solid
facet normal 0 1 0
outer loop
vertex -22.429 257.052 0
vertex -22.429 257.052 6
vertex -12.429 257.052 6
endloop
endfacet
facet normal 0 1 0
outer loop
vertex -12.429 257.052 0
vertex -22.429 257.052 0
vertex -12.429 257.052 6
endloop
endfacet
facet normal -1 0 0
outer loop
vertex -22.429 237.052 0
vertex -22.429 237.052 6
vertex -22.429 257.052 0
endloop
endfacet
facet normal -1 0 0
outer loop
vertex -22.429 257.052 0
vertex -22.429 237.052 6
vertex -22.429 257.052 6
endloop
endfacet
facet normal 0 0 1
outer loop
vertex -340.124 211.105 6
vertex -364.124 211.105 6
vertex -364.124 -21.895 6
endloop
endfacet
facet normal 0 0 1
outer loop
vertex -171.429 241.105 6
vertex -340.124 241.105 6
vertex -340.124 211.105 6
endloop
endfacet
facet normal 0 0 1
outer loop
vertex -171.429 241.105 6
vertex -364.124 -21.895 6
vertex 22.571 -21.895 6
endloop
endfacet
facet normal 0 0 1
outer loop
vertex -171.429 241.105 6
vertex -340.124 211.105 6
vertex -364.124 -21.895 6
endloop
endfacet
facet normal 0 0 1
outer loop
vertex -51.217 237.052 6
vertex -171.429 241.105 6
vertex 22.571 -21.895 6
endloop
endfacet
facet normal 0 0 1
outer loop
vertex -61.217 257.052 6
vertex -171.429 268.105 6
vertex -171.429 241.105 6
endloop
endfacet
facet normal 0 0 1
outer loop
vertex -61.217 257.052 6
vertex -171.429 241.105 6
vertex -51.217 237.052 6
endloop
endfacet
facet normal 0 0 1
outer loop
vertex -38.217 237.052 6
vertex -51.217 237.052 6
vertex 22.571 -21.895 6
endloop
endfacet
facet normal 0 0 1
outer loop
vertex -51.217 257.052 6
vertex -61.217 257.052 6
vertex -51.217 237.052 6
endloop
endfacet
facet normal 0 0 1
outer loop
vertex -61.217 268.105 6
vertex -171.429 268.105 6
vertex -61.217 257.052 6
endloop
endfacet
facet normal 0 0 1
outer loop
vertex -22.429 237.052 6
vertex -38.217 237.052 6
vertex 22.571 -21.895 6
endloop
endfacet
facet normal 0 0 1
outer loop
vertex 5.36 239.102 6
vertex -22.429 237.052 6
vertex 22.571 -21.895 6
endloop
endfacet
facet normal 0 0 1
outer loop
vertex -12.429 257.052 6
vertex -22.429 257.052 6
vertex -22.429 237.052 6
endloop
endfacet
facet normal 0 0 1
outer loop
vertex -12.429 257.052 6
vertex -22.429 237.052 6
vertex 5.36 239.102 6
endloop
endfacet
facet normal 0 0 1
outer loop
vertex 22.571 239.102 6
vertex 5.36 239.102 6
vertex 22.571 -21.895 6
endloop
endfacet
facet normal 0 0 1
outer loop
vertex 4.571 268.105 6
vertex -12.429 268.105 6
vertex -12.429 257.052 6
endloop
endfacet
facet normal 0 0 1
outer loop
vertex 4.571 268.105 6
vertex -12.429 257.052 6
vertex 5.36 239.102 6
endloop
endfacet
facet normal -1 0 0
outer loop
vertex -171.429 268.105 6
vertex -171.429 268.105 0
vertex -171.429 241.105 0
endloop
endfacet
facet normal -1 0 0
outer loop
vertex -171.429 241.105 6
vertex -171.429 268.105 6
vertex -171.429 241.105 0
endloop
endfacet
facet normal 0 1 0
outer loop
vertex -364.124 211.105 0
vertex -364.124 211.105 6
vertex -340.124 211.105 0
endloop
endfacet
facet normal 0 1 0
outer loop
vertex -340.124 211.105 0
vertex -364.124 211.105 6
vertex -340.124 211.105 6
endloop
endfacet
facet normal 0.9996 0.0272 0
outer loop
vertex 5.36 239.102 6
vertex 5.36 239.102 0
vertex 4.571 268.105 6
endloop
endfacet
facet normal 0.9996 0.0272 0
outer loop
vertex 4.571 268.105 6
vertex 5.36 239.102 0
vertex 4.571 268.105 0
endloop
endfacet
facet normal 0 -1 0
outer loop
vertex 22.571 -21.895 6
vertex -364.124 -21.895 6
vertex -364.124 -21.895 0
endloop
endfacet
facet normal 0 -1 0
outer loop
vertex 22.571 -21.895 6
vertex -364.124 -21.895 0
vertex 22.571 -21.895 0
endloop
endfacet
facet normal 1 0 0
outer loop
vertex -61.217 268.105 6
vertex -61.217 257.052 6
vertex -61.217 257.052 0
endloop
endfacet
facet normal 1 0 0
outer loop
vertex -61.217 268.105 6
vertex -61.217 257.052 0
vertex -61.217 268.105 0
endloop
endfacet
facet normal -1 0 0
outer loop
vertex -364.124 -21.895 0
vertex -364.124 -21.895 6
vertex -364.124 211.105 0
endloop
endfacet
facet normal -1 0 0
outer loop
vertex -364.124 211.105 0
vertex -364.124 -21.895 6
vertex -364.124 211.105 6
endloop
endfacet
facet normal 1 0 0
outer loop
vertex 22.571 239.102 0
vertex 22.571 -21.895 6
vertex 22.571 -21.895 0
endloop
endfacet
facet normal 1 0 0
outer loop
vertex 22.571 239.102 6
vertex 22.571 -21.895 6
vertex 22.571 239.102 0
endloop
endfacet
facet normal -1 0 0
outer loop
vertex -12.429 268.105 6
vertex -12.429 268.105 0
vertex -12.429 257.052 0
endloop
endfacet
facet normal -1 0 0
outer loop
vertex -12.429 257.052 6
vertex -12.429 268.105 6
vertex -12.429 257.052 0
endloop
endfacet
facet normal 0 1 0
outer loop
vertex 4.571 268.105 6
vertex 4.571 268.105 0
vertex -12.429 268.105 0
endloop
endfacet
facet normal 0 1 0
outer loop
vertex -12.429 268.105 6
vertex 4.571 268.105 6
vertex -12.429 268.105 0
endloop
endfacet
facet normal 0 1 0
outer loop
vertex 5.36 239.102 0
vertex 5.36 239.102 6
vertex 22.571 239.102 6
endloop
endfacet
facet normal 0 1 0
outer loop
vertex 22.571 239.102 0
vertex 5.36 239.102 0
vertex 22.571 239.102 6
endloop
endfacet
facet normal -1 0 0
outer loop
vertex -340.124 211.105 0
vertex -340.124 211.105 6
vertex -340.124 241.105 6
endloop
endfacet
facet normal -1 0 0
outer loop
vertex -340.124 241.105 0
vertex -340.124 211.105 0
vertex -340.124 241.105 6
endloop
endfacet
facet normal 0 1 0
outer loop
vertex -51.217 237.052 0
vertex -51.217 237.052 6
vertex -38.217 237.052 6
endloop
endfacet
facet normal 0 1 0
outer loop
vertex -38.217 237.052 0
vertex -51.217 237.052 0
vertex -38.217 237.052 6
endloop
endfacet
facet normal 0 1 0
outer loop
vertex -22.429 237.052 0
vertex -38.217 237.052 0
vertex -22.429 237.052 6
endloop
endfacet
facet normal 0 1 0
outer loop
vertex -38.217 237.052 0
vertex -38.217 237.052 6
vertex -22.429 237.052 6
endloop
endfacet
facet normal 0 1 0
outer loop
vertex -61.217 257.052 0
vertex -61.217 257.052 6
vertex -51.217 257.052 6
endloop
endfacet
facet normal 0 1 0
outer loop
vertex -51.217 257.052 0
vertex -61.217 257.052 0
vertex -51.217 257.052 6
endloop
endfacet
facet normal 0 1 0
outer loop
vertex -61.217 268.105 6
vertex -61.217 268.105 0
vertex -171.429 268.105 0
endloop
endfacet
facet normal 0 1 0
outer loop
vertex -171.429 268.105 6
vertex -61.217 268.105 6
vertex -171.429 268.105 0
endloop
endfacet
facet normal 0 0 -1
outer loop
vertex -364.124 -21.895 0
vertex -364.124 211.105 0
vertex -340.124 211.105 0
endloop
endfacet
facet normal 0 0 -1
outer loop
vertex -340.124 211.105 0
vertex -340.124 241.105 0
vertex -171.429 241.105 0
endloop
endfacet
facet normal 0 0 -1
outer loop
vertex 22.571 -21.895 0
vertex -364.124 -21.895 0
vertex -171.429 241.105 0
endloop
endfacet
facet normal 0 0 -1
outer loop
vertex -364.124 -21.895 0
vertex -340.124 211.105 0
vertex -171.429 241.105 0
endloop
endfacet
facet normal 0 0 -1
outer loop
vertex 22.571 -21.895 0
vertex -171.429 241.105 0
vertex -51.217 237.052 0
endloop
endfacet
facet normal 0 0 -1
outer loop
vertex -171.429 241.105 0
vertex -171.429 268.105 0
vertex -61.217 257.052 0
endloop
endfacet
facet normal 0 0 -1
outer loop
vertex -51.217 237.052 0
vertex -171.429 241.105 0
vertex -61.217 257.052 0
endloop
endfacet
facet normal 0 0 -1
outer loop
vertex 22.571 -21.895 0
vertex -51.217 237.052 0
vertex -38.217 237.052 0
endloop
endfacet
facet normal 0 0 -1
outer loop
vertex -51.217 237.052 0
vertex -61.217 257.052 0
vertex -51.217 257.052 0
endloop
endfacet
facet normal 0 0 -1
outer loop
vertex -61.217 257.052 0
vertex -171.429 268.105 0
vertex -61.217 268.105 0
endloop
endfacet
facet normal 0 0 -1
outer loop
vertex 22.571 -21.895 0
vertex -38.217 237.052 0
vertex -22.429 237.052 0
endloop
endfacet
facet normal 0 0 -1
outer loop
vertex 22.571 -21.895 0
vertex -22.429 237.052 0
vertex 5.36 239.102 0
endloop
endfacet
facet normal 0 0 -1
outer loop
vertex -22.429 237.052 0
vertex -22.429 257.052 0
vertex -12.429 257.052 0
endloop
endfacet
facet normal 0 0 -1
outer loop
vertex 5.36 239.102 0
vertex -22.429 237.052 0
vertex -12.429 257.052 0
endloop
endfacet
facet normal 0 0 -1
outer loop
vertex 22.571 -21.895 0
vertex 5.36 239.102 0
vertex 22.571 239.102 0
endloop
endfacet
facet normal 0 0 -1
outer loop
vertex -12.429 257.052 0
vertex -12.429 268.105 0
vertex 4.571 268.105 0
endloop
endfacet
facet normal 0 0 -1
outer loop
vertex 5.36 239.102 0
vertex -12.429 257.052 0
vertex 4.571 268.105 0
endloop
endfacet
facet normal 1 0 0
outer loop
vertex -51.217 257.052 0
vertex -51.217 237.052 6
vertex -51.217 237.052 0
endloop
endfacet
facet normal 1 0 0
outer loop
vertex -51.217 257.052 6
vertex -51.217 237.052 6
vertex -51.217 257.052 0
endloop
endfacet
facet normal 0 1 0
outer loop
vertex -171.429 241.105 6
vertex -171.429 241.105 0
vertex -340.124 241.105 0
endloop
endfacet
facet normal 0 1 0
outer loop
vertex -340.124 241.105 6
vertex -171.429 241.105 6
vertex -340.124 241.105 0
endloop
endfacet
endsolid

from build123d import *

# Parameters (mm, degrees)
BOSS_EXTRUDE1_DEPTH = 6
SKETCH2_W           = 30
SKETCH2_H           = 30
CUT_EXTRUDE1_DEPTH  = 10
SKETCH3_W           = 398.694966145
SKETCH3_H           = 1
CUT_EXTRUDE2_DEPTH  = 10
SKETCH4_W           = 6
SKETCH4_H           = 233
SKETCH4_H_2         = 258.947078575
CUT_EXTRUDE3_DEPTH  = 10
SKETCH5_W           = 23
SKETCH5_H           = 31.052921425
CUT_EXTRUDE4_DEPTH  = 10
SKETCH6_W           = 10
SKETCH6_H           = 20
BOSS_EXTRUDE2_DEPTH = 6
SKETCH7_W           = 17.21166374
SKETCH7_H           = 2.05
BOSS_EXTRUDE3_DEPTH = 6


with BuildPart() as part:
    # Sketch1 → Boss-Extrude1 (new body)
    with BuildSketch(Plane.XY):
        Polygon((28.571428571, 236.060202245), (28.571428571, 237.05184048), (5.415486436, 237.05184048), (4.571428571, 268.104761905), (-12.428571429, 268.104761905), (-12.428571429, 237.05184048), (-38.216595912, 237.05184048), (-38.216595912, 268.104761905), (-171.428571429, 268.104761905), (-171.428571429, 241.104761905), (-370.123537574, 241.104761905), (-370.123537574, -22.895238095), (28.571428571, -22.895238095), align=None)
    extrude(amount=BOSS_EXTRUDE1_DEPTH)

    # Sketch2 → Cut-Extrude1 (cut)
    with BuildSketch(Plane.XY.offset(6)):
        with Locations((-355.123537574, 226.104761905)):
            Rectangle(SKETCH2_W, SKETCH2_H)
    extrude(amount=-CUT_EXTRUDE1_DEPTH, mode=Mode.SUBTRACT)

    # Sketch3 → Cut-Extrude2 (cut)
    with BuildSketch(Plane.XY.offset(6)):
        with Locations((-170.776054501, -22.395238095)):
            Rectangle(SKETCH3_W, SKETCH3_H)
    extrude(amount=-CUT_EXTRUDE2_DEPTH, mode=Mode.SUBTRACT)

    # Sketch4 → Cut-Extrude3 (cut)
    with BuildSketch(Plane.XY.offset(6)):
        with Locations((-367.123537574, 94.604761905)):
            Rectangle(SKETCH4_W, SKETCH4_H)
        with Locations((25.571428571, 107.578301193)):
            Rectangle(SKETCH4_W, SKETCH4_H_2)
    extrude(amount=-CUT_EXTRUDE3_DEPTH, mode=Mode.SUBTRACT)

    # Sketch5 → Cut-Extrude4 (cut)
    with BuildSketch(Plane.XY.offset(6)):
        with Locations((-49.716595912, 252.578301193)):
            Rectangle(SKETCH5_W, SKETCH5_H)
    extrude(amount=-CUT_EXTRUDE4_DEPTH, mode=Mode.SUBTRACT)

    # Sketch6 → Boss-Extrude2 (add)
    with BuildSketch(Plane.XY.offset(6)):
        with Locations((-17.428571429, 247.05184048)):
            Rectangle(SKETCH6_W, SKETCH6_H)
        with Locations((-56.216595912, 247.05184048)):
            Rectangle(SKETCH6_W, SKETCH6_H)
    extrude(amount=-BOSS_EXTRUDE2_DEPTH)

    # Sketch7 → Boss-Extrude3 (add)
    with BuildSketch(Plane.XY.offset(6)):
        with Locations((13.965596701, 238.07684048)):
            Rectangle(SKETCH7_W, SKETCH7_H)
    extrude(amount=-BOSS_EXTRUDE3_DEPTH)


solid = part.part
